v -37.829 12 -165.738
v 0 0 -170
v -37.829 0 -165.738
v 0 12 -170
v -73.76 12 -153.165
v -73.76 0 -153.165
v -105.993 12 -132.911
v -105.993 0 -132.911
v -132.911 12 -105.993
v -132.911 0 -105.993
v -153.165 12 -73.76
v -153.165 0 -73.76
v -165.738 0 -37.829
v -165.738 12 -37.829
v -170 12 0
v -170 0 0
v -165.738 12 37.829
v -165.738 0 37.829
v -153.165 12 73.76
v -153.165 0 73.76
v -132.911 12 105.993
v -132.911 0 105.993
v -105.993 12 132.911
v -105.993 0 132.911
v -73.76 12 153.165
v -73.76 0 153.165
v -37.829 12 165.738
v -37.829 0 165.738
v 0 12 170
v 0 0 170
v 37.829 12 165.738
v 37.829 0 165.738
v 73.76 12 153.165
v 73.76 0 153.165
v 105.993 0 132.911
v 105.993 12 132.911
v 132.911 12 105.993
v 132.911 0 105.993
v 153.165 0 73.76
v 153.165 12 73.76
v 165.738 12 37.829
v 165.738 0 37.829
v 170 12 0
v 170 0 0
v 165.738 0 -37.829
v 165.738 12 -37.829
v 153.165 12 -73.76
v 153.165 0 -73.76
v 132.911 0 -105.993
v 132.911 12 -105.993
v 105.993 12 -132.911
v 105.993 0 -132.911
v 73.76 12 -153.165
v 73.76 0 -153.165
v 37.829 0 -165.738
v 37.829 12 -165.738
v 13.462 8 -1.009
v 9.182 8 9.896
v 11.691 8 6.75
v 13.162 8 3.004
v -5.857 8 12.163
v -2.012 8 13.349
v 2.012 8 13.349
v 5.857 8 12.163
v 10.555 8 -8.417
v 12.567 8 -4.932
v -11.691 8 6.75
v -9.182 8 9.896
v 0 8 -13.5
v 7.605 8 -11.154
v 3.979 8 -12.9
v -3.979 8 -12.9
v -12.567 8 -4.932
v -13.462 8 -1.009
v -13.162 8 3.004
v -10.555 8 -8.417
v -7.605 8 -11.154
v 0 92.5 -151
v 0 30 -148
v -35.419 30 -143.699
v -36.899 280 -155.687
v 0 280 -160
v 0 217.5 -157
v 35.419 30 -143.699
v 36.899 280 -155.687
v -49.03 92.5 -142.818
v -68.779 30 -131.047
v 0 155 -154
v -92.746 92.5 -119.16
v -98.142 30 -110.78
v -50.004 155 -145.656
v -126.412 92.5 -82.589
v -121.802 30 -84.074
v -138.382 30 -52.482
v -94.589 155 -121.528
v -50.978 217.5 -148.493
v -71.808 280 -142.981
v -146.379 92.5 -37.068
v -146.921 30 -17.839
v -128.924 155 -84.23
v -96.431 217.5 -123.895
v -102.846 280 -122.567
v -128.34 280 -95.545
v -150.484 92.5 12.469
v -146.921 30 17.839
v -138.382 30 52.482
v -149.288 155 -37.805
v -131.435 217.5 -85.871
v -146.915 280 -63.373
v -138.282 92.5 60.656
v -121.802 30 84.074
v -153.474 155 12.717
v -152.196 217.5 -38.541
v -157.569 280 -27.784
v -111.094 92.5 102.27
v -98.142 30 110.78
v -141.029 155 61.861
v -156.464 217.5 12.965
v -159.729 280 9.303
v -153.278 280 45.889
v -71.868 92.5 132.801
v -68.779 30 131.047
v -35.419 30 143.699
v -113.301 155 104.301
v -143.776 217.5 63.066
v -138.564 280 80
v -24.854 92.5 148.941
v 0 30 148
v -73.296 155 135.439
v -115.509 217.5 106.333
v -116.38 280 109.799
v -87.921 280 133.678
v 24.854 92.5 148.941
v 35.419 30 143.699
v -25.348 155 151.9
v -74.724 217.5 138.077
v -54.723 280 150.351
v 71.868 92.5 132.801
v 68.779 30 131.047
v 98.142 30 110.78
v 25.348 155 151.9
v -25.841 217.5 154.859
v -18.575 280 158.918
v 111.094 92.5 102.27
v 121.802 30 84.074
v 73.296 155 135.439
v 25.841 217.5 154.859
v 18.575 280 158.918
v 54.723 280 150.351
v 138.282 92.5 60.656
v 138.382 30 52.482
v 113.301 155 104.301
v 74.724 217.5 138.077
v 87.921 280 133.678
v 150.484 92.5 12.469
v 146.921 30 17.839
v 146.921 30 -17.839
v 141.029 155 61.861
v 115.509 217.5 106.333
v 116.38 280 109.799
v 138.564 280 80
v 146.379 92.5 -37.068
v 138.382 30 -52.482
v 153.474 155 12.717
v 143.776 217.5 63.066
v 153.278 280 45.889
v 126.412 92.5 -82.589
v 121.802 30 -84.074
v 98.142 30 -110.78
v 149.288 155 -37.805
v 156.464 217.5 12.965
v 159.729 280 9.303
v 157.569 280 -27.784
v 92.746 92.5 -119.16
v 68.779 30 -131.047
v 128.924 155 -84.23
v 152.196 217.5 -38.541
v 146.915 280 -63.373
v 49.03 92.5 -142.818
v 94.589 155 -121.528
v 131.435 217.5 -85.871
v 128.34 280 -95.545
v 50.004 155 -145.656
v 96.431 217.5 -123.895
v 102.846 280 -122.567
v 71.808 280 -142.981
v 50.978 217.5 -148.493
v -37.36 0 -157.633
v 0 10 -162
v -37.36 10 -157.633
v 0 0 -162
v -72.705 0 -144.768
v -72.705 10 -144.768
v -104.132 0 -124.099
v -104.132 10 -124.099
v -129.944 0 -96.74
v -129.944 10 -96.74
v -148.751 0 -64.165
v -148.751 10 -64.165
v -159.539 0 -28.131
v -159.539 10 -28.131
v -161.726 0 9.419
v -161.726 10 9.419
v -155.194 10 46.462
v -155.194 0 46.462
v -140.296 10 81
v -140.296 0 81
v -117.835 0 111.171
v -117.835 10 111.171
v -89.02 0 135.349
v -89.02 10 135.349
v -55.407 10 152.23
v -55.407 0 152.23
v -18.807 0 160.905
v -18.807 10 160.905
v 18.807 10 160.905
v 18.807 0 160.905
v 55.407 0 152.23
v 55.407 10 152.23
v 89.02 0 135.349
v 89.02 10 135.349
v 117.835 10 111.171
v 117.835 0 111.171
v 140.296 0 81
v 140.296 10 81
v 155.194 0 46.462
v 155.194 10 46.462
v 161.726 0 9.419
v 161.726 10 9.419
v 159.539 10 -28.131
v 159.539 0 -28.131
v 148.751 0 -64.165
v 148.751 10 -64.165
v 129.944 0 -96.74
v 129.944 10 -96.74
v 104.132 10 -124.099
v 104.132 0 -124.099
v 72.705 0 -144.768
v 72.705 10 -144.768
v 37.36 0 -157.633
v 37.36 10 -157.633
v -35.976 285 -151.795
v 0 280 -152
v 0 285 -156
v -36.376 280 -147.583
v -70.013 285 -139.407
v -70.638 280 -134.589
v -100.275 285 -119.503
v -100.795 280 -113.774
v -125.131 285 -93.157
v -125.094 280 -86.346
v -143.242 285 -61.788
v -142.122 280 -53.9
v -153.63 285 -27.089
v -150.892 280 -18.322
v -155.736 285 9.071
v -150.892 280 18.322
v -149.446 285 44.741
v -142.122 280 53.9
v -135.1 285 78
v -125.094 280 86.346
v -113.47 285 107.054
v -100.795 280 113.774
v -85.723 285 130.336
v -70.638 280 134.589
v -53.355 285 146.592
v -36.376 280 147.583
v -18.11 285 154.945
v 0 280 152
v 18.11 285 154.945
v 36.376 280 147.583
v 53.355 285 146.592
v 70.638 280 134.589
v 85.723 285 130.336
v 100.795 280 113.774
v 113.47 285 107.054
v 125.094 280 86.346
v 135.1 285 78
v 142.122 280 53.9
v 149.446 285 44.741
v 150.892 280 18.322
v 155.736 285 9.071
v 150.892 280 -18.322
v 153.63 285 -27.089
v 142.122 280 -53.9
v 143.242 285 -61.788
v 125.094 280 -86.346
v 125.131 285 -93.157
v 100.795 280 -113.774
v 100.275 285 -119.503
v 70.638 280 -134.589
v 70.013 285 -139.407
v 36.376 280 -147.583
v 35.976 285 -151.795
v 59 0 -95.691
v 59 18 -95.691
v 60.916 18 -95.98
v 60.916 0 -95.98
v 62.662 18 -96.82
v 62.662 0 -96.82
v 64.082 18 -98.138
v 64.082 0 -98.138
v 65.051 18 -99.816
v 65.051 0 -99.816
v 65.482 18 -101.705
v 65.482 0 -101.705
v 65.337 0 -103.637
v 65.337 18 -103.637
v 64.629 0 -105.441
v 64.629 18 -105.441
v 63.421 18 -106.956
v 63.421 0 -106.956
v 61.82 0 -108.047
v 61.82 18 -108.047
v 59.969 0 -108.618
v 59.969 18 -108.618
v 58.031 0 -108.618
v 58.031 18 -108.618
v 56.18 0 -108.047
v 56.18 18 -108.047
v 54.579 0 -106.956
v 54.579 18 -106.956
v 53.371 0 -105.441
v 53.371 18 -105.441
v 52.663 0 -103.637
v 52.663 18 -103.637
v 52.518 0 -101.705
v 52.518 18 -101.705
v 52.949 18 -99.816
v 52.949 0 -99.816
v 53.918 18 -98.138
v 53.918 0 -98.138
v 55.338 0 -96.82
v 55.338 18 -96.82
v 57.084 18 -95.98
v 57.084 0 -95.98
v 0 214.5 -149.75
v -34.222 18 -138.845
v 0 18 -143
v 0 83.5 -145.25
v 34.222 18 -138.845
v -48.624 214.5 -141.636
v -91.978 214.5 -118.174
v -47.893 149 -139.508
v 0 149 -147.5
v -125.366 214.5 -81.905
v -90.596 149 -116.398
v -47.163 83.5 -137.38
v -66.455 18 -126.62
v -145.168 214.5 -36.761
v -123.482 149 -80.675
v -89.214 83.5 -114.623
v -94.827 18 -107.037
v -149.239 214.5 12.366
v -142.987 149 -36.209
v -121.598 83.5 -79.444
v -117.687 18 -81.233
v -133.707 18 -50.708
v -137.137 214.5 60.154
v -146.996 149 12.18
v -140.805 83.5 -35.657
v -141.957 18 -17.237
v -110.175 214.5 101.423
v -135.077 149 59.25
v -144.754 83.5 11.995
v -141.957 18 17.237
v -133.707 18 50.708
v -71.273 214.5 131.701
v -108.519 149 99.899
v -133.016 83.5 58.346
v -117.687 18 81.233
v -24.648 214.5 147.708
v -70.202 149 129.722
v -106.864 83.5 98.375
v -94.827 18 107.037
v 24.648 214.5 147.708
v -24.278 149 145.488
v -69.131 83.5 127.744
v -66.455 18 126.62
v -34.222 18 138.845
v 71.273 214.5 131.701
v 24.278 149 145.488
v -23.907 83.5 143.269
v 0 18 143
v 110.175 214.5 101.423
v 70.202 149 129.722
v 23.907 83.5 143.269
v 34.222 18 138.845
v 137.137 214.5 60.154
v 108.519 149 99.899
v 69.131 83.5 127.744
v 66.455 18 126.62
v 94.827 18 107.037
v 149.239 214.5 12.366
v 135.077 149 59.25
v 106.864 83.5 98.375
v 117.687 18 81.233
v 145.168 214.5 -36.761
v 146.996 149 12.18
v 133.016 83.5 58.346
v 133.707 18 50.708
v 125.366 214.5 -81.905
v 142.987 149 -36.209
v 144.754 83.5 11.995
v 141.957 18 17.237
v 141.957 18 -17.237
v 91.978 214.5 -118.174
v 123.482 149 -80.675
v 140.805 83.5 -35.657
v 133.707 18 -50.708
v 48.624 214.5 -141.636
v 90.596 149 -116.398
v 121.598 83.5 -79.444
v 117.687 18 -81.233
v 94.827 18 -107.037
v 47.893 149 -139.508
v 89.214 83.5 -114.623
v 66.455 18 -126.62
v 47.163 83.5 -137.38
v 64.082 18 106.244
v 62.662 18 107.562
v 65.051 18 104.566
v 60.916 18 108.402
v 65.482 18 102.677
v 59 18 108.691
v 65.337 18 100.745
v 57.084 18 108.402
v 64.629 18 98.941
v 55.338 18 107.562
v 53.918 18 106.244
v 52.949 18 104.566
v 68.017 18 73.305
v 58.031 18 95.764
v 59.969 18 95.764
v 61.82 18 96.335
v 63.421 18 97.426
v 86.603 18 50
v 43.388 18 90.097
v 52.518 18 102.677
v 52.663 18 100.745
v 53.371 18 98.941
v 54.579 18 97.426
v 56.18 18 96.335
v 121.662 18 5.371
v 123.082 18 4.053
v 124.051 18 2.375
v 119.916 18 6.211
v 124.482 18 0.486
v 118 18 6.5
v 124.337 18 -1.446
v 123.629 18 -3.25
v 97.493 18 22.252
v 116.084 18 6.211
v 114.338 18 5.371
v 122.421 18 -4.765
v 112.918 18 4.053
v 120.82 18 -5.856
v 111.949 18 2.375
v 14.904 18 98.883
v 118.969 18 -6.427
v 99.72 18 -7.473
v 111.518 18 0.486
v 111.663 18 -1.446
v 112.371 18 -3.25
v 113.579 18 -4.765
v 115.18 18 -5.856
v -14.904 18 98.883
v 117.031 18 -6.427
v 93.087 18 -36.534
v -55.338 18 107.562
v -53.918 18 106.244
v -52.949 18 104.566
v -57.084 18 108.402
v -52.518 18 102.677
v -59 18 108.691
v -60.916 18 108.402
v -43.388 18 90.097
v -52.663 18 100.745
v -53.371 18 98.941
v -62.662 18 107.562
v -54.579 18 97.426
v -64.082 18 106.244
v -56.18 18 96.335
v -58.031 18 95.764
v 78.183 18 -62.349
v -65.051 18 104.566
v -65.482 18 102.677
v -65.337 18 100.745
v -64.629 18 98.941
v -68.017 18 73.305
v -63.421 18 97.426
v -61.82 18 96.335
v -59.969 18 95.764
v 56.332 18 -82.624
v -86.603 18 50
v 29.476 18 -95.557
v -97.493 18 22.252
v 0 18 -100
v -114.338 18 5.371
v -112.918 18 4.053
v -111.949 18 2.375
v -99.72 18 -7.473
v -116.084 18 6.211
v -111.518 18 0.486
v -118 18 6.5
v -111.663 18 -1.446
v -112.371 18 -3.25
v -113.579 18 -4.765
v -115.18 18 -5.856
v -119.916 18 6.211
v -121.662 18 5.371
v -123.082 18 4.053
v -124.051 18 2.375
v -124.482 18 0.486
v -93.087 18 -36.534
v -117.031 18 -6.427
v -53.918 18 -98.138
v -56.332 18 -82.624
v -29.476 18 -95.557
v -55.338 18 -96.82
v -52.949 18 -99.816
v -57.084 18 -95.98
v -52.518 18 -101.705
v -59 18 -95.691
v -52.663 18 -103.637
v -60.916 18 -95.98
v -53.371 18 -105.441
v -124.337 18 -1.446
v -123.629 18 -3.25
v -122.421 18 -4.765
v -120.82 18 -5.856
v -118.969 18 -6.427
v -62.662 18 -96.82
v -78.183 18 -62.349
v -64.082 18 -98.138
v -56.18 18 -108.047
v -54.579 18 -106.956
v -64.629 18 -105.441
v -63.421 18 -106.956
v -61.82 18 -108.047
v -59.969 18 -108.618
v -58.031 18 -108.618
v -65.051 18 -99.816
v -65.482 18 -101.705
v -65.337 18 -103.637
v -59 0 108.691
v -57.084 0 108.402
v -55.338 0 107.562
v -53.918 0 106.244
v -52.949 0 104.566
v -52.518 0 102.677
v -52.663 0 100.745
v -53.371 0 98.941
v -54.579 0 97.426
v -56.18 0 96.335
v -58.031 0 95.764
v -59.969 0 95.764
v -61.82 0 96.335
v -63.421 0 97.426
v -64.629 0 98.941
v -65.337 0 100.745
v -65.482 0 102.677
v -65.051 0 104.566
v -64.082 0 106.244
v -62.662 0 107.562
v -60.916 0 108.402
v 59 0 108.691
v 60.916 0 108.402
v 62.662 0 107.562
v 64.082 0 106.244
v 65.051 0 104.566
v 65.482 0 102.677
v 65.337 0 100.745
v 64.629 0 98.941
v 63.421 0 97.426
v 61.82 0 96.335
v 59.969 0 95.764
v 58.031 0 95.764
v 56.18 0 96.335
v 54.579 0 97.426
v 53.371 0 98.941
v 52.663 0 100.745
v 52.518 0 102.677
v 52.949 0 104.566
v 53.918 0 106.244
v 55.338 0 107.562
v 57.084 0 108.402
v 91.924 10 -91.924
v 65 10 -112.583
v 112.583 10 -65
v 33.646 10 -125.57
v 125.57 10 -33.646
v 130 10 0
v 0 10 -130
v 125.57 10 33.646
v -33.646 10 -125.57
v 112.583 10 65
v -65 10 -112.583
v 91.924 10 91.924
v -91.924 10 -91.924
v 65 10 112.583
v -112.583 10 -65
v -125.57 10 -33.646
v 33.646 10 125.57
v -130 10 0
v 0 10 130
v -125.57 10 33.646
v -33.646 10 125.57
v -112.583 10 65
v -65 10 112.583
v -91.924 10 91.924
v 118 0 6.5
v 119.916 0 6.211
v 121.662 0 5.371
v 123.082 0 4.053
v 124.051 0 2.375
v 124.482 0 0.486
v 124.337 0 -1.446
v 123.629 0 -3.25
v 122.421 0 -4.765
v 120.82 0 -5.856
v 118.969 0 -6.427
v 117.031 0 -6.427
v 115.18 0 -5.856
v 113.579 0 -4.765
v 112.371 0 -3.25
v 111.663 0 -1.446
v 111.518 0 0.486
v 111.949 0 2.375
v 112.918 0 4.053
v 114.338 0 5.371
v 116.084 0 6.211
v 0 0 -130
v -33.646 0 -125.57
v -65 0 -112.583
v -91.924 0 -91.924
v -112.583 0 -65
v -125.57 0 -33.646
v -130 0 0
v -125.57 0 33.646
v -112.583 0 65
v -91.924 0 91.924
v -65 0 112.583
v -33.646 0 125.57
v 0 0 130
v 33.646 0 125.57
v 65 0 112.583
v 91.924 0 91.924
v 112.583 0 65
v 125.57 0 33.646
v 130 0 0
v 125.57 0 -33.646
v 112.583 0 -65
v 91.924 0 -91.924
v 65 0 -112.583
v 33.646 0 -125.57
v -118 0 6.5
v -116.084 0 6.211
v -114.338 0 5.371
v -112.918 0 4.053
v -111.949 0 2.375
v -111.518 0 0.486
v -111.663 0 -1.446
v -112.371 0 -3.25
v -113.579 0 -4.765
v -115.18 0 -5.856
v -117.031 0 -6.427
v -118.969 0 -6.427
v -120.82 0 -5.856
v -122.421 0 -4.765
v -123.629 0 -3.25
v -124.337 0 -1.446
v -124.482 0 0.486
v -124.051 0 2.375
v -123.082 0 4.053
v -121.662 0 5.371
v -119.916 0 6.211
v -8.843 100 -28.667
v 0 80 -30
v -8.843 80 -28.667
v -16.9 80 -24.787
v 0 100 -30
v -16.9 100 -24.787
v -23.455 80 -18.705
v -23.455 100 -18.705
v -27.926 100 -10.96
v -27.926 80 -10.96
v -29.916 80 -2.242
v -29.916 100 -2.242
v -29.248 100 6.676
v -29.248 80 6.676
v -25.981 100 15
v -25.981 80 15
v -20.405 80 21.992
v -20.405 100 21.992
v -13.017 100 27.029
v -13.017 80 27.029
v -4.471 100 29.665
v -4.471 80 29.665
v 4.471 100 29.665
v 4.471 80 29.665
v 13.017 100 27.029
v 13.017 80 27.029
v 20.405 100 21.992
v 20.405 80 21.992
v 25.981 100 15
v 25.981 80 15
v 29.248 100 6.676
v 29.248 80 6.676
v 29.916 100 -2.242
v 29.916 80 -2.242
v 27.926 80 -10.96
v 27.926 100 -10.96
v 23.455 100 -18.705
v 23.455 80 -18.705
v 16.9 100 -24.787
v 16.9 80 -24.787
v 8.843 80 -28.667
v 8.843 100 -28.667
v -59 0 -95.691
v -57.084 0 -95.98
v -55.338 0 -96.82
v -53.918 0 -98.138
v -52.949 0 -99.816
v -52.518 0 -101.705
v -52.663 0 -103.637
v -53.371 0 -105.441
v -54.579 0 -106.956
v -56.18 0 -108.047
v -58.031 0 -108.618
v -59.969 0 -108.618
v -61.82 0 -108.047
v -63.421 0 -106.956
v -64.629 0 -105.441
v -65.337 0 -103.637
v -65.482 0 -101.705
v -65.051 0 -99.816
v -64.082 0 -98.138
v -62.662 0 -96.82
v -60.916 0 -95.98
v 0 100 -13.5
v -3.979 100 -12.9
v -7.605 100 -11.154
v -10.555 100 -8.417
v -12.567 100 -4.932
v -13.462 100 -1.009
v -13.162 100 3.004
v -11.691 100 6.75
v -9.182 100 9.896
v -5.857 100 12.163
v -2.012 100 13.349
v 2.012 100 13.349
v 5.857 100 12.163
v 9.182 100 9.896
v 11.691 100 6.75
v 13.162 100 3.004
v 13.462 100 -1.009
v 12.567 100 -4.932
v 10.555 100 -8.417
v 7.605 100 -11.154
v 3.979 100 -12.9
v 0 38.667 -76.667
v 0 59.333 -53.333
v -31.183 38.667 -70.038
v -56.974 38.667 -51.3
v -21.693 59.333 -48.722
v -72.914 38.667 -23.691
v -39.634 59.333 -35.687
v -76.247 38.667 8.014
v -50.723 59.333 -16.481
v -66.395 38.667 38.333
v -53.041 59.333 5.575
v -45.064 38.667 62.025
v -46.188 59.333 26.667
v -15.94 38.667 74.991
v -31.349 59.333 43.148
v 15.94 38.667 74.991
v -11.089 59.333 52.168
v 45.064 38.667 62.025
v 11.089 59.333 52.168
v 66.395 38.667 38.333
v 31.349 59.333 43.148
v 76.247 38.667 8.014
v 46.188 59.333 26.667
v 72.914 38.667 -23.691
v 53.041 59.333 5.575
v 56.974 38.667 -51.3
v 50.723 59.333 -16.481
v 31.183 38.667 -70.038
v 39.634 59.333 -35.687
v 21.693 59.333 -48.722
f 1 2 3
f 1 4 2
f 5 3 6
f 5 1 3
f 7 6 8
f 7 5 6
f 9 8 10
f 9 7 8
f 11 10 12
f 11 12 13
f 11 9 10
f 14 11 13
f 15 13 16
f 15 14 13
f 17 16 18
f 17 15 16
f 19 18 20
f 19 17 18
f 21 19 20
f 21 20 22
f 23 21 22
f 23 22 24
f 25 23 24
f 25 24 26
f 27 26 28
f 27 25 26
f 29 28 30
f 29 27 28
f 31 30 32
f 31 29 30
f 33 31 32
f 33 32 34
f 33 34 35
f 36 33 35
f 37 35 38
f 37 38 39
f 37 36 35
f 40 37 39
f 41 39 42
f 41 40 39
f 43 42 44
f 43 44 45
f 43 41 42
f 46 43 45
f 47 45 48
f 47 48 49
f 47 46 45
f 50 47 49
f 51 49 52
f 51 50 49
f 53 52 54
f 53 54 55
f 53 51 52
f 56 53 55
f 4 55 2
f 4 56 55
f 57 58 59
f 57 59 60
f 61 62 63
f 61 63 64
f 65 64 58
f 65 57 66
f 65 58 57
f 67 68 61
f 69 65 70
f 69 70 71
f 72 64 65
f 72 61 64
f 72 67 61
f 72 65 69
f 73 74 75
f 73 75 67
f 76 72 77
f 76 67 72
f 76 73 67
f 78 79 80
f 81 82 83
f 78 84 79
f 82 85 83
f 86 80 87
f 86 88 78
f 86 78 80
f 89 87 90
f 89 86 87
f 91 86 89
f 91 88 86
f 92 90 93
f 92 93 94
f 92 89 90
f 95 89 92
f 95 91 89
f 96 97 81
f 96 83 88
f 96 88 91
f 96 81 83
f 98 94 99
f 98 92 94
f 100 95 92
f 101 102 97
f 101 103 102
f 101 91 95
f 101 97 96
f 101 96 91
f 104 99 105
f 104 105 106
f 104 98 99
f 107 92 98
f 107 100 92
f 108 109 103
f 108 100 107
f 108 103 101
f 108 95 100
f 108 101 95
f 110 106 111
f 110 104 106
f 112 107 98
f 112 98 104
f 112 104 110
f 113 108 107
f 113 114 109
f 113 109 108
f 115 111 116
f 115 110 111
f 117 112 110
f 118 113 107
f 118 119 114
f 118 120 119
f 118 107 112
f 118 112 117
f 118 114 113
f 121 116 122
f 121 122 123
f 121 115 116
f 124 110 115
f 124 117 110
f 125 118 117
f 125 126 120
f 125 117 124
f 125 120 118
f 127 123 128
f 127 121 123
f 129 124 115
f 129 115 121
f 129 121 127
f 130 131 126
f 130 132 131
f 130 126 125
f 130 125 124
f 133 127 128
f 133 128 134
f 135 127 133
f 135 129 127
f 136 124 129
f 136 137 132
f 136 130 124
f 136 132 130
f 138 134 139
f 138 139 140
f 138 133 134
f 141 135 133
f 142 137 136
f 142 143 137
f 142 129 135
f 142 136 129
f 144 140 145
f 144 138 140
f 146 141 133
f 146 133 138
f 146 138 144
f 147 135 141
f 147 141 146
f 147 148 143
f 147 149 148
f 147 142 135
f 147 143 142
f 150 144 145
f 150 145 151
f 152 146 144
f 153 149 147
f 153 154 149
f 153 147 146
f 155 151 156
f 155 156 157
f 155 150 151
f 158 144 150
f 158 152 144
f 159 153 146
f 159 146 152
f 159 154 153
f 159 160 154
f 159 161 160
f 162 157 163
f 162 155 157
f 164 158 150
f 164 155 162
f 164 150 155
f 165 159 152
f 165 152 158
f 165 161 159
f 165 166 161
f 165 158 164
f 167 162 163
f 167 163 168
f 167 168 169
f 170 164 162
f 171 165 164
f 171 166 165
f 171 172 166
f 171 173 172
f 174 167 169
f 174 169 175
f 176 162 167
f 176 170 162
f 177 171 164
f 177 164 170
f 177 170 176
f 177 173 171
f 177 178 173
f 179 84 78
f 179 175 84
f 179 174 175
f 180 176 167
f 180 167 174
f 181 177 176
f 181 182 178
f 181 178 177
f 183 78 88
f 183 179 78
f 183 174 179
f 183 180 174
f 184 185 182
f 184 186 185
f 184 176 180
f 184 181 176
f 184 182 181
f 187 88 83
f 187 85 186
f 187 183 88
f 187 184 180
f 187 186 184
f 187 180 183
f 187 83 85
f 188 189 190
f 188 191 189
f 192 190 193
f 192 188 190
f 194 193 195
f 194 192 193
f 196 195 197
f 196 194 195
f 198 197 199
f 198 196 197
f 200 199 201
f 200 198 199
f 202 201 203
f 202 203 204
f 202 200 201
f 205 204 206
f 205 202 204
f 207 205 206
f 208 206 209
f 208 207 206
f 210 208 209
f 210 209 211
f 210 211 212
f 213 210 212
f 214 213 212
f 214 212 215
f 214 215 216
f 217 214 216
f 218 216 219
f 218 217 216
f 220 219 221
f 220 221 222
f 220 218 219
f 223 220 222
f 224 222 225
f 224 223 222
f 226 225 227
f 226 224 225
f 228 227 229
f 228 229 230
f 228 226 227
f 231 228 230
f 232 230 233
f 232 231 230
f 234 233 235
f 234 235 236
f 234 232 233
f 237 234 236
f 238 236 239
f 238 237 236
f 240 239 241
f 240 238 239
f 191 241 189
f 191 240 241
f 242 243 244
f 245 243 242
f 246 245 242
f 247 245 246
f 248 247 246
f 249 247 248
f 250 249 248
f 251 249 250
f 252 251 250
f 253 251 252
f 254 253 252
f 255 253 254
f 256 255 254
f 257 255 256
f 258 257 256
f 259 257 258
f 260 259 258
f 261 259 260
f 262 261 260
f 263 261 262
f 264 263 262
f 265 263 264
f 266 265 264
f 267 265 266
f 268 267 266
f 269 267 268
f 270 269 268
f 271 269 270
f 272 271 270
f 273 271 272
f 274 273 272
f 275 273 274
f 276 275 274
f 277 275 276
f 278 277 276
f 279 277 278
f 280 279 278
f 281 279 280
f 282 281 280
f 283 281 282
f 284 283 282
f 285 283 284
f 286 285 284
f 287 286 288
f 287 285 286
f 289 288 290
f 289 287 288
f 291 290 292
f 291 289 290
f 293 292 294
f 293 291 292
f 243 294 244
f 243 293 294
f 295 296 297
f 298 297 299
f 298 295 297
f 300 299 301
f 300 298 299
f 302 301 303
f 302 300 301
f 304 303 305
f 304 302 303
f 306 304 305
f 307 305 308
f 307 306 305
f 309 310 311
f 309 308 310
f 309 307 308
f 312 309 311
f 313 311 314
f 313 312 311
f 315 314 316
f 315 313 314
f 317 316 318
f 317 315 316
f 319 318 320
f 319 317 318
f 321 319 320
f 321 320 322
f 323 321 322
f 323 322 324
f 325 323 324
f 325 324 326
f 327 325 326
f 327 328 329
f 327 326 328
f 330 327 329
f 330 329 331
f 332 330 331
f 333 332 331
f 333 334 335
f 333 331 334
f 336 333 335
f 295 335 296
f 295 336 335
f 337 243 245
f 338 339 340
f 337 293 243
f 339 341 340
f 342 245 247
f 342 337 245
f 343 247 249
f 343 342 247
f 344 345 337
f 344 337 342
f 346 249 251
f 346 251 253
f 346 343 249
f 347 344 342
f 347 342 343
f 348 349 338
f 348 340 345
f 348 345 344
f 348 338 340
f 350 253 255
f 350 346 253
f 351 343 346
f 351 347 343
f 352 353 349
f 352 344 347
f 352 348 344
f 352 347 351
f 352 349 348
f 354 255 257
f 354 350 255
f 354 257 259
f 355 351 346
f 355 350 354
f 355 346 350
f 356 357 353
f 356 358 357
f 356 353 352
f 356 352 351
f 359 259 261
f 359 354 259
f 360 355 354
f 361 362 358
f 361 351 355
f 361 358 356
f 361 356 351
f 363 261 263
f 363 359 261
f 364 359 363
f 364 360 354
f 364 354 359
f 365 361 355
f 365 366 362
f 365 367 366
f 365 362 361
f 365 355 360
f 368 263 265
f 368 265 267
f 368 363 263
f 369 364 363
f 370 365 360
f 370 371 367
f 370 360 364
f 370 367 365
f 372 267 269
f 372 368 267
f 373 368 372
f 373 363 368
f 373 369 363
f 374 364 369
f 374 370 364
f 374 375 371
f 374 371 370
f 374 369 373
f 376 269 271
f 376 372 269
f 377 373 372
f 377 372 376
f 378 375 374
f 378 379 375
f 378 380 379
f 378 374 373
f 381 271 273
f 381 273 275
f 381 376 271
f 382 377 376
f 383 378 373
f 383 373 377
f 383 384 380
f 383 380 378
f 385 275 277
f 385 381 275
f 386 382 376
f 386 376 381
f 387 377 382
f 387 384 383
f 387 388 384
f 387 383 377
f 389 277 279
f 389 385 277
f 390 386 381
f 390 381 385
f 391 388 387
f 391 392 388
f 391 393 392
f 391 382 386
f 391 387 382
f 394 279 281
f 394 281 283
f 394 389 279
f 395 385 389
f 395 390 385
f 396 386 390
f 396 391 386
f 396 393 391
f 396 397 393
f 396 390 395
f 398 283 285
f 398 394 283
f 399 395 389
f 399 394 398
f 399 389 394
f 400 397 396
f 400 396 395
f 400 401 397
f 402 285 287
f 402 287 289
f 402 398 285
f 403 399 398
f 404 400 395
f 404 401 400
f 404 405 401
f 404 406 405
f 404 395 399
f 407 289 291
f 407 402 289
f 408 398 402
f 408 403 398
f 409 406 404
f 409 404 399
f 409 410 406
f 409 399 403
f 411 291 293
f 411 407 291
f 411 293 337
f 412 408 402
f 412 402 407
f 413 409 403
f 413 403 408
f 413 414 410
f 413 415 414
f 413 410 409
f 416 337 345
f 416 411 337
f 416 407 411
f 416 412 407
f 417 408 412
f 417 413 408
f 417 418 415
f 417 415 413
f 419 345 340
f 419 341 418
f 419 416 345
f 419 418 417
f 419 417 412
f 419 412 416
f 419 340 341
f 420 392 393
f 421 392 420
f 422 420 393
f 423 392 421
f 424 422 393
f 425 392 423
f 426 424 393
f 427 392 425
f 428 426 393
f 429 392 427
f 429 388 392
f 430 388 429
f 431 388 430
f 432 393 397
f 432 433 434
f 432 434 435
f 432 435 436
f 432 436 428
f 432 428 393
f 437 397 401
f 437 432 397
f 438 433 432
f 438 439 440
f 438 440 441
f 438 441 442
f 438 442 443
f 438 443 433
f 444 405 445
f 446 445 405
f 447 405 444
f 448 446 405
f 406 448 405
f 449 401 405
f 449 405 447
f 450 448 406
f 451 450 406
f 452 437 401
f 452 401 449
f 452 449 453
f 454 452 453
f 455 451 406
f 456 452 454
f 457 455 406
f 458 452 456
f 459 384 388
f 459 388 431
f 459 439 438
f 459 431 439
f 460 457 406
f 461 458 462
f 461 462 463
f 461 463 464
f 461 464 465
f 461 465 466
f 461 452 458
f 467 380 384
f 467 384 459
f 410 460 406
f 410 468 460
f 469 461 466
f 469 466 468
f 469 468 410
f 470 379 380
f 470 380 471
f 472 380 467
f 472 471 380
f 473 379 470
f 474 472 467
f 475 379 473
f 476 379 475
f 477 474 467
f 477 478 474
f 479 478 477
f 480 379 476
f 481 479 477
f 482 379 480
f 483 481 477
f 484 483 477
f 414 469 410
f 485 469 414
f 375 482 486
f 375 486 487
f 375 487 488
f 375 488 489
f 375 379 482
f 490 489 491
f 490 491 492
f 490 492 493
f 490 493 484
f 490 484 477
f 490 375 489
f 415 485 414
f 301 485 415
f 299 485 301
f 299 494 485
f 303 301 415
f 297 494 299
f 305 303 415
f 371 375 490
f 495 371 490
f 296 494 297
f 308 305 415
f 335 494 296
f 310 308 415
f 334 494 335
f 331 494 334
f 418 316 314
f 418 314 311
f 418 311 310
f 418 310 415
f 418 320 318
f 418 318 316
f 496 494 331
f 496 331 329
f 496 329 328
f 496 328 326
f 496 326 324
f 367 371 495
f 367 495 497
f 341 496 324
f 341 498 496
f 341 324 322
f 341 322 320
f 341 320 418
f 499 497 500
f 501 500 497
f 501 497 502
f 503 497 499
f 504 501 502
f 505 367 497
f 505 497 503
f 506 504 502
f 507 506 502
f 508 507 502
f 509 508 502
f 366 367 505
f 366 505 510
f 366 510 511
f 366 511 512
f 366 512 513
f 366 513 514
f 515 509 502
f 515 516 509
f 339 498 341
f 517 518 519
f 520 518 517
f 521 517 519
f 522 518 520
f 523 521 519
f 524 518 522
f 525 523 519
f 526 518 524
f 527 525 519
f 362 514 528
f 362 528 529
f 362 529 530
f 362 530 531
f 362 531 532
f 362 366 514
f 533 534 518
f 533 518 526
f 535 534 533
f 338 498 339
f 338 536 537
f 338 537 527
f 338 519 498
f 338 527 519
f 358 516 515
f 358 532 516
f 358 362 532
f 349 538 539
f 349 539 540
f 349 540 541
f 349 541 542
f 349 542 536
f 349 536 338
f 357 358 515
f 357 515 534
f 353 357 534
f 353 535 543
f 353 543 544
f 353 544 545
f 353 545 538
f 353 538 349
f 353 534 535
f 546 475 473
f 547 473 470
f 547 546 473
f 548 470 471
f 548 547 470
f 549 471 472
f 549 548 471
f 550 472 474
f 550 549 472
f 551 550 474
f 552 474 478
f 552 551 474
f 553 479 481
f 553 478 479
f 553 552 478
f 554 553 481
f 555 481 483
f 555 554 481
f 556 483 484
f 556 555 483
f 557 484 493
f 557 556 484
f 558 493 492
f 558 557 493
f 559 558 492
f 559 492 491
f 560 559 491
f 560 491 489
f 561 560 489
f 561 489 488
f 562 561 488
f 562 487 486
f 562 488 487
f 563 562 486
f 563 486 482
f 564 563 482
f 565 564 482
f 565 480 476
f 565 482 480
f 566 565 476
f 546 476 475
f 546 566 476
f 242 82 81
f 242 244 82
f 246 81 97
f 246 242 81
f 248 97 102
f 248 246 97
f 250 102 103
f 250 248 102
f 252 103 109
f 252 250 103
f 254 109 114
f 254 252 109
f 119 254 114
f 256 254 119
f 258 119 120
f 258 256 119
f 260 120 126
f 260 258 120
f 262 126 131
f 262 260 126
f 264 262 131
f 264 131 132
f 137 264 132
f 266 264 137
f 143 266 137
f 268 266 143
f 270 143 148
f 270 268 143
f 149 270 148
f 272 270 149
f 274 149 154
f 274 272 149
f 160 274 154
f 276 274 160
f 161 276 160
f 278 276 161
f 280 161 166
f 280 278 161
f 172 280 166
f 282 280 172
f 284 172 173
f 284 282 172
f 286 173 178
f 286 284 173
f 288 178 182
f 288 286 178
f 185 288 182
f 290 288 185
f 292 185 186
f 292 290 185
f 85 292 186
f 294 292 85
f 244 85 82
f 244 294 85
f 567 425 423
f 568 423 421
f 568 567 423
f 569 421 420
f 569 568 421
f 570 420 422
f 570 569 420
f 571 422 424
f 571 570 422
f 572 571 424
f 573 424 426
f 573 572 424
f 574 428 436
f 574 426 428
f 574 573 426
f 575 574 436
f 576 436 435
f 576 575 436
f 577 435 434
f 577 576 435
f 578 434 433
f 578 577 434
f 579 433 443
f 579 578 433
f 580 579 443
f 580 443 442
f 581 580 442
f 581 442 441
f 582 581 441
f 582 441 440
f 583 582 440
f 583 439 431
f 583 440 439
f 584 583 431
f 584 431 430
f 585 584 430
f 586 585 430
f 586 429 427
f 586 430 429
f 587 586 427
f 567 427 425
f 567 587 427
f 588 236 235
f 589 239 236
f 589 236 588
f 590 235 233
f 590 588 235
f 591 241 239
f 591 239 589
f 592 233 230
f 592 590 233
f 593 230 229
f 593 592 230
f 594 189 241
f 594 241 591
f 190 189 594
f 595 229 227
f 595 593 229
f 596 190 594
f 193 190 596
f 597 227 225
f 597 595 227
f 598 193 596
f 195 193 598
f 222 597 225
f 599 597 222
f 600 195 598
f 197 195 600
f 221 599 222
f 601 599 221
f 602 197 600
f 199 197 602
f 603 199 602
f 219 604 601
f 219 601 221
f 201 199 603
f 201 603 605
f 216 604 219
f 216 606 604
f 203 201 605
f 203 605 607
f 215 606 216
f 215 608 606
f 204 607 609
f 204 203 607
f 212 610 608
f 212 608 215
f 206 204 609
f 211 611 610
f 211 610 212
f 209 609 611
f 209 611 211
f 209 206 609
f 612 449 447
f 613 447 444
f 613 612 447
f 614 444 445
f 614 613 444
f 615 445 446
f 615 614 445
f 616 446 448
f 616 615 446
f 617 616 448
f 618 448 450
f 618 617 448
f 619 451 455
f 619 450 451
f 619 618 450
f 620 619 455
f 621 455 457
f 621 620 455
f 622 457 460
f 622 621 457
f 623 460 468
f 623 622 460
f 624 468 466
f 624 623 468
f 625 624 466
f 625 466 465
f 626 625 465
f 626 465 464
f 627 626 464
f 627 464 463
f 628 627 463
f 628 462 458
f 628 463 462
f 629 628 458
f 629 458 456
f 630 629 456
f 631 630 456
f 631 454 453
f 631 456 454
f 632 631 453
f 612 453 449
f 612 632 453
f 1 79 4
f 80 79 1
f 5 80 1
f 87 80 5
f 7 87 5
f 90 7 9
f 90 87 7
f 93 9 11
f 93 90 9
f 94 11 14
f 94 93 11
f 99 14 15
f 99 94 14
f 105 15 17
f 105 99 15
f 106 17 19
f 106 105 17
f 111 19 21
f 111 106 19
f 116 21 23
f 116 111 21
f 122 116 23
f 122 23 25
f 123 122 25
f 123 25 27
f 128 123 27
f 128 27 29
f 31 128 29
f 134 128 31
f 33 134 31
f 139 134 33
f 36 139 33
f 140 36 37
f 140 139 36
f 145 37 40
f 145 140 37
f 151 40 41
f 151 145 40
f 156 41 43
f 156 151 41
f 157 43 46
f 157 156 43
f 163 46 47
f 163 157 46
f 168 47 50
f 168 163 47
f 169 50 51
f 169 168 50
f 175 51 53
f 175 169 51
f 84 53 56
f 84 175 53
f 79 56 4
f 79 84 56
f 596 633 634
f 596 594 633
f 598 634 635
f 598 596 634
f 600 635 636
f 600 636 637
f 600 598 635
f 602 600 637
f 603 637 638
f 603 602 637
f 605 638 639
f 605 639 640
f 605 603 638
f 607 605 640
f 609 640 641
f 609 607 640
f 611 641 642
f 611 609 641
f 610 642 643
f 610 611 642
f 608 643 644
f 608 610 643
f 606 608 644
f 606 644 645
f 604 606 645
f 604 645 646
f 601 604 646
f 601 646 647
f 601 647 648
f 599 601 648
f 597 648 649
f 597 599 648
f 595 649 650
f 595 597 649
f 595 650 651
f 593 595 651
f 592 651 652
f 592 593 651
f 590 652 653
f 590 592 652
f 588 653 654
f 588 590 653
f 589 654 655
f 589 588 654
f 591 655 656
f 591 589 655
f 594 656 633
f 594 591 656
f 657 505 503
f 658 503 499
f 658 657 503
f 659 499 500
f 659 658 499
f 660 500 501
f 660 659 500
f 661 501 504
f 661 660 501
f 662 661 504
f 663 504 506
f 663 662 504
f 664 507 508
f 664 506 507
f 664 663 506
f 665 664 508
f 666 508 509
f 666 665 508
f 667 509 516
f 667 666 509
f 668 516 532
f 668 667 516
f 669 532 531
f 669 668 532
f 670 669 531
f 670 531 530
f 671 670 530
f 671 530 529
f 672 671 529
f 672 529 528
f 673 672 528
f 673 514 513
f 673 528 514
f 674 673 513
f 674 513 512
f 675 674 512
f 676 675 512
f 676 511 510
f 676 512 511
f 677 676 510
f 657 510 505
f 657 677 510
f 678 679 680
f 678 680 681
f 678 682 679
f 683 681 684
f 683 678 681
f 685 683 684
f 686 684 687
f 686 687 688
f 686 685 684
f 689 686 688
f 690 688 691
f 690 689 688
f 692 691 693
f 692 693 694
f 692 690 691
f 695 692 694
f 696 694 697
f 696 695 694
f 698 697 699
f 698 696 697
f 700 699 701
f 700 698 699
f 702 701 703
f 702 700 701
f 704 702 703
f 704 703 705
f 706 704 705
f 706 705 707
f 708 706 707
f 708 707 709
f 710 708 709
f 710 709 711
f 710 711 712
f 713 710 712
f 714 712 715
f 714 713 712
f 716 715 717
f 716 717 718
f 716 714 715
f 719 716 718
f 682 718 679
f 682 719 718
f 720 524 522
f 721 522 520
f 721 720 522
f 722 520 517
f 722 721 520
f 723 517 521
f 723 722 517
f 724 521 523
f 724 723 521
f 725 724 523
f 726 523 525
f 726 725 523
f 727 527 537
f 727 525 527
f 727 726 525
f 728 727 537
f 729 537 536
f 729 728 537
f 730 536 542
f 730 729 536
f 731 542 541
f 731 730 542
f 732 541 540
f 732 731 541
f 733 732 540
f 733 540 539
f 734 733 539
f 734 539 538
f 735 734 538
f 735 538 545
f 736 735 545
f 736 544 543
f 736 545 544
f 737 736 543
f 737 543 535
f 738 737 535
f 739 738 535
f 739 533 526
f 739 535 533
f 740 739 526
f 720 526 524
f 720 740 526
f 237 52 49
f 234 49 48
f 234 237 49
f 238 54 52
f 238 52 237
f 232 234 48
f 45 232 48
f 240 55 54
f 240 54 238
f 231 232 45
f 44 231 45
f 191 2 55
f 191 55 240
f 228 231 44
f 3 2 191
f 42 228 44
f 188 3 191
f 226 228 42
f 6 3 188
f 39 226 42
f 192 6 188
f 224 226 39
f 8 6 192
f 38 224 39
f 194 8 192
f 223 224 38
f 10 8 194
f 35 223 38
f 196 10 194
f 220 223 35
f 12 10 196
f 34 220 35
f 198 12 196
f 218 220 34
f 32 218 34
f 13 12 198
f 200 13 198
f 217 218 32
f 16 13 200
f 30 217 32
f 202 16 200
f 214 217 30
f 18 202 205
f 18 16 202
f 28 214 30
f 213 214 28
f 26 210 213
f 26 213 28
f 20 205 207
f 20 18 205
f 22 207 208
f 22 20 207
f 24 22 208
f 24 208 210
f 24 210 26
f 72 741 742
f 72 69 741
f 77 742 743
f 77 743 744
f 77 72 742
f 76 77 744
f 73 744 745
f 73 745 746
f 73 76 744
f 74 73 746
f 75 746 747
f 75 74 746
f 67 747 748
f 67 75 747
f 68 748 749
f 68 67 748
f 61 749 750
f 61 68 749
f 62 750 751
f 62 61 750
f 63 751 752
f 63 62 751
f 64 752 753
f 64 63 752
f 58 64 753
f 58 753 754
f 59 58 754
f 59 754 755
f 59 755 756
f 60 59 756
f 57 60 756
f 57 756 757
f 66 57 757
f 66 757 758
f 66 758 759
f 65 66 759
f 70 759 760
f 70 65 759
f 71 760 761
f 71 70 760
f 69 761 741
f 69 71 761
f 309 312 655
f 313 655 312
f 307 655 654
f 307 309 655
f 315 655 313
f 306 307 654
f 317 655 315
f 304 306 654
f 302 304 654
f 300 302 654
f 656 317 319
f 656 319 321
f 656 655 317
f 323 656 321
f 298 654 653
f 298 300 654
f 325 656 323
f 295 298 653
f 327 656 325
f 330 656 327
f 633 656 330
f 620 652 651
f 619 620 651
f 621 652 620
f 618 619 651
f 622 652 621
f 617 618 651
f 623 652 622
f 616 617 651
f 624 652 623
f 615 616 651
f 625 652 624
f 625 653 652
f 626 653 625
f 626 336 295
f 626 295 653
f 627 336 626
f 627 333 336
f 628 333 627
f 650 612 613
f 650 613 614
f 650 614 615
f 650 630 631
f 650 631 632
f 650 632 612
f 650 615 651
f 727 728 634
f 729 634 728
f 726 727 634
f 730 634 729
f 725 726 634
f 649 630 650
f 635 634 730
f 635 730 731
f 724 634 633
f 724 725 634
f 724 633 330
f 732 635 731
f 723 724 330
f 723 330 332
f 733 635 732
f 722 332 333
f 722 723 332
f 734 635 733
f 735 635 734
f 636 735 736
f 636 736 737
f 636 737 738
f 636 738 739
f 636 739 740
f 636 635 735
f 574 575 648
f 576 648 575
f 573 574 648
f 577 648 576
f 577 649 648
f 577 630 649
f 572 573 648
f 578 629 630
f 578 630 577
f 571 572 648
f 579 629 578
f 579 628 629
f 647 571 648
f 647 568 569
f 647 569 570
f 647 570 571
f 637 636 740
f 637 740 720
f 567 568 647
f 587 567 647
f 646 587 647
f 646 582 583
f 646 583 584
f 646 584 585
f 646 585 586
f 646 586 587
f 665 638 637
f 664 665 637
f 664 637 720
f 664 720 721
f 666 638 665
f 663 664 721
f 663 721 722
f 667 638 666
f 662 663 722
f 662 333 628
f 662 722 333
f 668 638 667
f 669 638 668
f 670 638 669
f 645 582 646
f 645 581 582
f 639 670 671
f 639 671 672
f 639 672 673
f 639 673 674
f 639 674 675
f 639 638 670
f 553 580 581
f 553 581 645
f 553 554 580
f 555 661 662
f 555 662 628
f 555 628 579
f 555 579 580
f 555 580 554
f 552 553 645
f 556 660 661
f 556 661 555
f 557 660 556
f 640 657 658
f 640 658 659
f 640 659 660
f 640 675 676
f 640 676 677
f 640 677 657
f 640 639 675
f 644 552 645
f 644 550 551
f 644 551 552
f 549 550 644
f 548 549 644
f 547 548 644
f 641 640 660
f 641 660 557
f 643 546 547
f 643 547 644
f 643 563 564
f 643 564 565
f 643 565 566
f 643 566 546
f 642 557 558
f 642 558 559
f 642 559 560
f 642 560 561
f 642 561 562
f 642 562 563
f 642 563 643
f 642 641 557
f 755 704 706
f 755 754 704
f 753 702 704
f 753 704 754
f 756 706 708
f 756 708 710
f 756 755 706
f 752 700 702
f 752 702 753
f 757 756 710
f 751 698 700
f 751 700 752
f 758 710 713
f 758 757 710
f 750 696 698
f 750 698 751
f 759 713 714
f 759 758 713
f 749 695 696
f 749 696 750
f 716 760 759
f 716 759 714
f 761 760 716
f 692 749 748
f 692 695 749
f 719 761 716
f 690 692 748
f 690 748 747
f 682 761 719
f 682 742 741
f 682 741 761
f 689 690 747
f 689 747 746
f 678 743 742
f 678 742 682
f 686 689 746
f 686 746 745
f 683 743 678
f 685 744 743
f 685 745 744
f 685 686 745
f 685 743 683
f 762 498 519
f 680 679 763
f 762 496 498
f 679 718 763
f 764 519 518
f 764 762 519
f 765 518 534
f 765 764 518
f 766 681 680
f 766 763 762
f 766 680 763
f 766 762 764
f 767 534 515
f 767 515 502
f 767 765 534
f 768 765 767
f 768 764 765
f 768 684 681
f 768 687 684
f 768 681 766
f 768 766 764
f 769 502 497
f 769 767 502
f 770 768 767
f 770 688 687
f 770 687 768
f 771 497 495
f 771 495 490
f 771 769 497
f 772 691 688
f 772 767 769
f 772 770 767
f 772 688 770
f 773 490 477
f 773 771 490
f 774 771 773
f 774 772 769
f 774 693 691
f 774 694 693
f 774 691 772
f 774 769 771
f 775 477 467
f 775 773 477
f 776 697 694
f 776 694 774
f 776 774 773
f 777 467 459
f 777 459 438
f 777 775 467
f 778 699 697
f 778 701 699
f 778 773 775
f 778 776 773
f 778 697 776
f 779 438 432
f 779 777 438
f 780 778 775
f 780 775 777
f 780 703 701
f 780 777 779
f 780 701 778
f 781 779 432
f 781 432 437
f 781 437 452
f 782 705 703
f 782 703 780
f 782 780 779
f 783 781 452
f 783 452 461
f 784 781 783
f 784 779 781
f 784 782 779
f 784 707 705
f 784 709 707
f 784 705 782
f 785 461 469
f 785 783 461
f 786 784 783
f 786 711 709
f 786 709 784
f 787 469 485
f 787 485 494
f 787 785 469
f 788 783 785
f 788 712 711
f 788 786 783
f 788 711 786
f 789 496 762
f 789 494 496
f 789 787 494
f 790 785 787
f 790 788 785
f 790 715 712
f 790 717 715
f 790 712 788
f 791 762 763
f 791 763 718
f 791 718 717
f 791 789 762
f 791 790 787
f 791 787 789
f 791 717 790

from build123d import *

# Parameters (mm, degrees)
SKETCH2_R                = 6.5
SIX_DRAINAGE_HOLES_DEPTH = 373.86056375


with BuildPart() as part:
    # Sketch1 → Planter Body + Central Socket (revolve)
    with BuildSketch(Plane.XY, mode=Mode.PRIVATE) as planter_body_central_socket_sk:
        Polygon((0, 0), (130, 0), (130, 10), (162, 10), (162, 0), (170, 0), (170, 12), (148, 30), (160, 280), (156, 285), (152, 280), (143, 18), (100, 18), (30, 80), (30, 100), (13.5, 100), (13.5, 8), (0, 8), align=None)
    revolve(planter_body_central_socket_sk.sketch.rotate(Axis((0, -10, 0), (0, 1, 0)), 90), axis=Axis((0, -10, 0), (0, 1, 0)))

    # Sketch2 → Six Drainage Holes (cut, through all)
    with BuildSketch(Plane(origin=(0, 0, 0), x_dir=(1, 0, 0), z_dir=(0, 1, 0))):
        with Locations(Location((118, 0, 0), (0, 0, 270))):
            Circle(SKETCH2_R)
        with Locations(Location((59, 102.190997647, 0), (0, 0, 270))):
            Circle(SKETCH2_R)
        with Locations(Location((-59, 102.190997647, 0), (0, 0, 270))):
            Circle(SKETCH2_R)
        with Locations(Location((-118, 0, 0), (0, 0, 270))):
            Circle(SKETCH2_R)
        with Locations(Location((-59, -102.190997647, 0), (0, 0, 270))):
            Circle(SKETCH2_R)
        with Locations(Location((59, -102.190997647, 0), (0, 0, 270))):
            Circle(SKETCH2_R)
    extrude(amount=SIX_DRAINAGE_HOLES_DEPTH, mode=Mode.SUBTRACT)


solid = part.part
